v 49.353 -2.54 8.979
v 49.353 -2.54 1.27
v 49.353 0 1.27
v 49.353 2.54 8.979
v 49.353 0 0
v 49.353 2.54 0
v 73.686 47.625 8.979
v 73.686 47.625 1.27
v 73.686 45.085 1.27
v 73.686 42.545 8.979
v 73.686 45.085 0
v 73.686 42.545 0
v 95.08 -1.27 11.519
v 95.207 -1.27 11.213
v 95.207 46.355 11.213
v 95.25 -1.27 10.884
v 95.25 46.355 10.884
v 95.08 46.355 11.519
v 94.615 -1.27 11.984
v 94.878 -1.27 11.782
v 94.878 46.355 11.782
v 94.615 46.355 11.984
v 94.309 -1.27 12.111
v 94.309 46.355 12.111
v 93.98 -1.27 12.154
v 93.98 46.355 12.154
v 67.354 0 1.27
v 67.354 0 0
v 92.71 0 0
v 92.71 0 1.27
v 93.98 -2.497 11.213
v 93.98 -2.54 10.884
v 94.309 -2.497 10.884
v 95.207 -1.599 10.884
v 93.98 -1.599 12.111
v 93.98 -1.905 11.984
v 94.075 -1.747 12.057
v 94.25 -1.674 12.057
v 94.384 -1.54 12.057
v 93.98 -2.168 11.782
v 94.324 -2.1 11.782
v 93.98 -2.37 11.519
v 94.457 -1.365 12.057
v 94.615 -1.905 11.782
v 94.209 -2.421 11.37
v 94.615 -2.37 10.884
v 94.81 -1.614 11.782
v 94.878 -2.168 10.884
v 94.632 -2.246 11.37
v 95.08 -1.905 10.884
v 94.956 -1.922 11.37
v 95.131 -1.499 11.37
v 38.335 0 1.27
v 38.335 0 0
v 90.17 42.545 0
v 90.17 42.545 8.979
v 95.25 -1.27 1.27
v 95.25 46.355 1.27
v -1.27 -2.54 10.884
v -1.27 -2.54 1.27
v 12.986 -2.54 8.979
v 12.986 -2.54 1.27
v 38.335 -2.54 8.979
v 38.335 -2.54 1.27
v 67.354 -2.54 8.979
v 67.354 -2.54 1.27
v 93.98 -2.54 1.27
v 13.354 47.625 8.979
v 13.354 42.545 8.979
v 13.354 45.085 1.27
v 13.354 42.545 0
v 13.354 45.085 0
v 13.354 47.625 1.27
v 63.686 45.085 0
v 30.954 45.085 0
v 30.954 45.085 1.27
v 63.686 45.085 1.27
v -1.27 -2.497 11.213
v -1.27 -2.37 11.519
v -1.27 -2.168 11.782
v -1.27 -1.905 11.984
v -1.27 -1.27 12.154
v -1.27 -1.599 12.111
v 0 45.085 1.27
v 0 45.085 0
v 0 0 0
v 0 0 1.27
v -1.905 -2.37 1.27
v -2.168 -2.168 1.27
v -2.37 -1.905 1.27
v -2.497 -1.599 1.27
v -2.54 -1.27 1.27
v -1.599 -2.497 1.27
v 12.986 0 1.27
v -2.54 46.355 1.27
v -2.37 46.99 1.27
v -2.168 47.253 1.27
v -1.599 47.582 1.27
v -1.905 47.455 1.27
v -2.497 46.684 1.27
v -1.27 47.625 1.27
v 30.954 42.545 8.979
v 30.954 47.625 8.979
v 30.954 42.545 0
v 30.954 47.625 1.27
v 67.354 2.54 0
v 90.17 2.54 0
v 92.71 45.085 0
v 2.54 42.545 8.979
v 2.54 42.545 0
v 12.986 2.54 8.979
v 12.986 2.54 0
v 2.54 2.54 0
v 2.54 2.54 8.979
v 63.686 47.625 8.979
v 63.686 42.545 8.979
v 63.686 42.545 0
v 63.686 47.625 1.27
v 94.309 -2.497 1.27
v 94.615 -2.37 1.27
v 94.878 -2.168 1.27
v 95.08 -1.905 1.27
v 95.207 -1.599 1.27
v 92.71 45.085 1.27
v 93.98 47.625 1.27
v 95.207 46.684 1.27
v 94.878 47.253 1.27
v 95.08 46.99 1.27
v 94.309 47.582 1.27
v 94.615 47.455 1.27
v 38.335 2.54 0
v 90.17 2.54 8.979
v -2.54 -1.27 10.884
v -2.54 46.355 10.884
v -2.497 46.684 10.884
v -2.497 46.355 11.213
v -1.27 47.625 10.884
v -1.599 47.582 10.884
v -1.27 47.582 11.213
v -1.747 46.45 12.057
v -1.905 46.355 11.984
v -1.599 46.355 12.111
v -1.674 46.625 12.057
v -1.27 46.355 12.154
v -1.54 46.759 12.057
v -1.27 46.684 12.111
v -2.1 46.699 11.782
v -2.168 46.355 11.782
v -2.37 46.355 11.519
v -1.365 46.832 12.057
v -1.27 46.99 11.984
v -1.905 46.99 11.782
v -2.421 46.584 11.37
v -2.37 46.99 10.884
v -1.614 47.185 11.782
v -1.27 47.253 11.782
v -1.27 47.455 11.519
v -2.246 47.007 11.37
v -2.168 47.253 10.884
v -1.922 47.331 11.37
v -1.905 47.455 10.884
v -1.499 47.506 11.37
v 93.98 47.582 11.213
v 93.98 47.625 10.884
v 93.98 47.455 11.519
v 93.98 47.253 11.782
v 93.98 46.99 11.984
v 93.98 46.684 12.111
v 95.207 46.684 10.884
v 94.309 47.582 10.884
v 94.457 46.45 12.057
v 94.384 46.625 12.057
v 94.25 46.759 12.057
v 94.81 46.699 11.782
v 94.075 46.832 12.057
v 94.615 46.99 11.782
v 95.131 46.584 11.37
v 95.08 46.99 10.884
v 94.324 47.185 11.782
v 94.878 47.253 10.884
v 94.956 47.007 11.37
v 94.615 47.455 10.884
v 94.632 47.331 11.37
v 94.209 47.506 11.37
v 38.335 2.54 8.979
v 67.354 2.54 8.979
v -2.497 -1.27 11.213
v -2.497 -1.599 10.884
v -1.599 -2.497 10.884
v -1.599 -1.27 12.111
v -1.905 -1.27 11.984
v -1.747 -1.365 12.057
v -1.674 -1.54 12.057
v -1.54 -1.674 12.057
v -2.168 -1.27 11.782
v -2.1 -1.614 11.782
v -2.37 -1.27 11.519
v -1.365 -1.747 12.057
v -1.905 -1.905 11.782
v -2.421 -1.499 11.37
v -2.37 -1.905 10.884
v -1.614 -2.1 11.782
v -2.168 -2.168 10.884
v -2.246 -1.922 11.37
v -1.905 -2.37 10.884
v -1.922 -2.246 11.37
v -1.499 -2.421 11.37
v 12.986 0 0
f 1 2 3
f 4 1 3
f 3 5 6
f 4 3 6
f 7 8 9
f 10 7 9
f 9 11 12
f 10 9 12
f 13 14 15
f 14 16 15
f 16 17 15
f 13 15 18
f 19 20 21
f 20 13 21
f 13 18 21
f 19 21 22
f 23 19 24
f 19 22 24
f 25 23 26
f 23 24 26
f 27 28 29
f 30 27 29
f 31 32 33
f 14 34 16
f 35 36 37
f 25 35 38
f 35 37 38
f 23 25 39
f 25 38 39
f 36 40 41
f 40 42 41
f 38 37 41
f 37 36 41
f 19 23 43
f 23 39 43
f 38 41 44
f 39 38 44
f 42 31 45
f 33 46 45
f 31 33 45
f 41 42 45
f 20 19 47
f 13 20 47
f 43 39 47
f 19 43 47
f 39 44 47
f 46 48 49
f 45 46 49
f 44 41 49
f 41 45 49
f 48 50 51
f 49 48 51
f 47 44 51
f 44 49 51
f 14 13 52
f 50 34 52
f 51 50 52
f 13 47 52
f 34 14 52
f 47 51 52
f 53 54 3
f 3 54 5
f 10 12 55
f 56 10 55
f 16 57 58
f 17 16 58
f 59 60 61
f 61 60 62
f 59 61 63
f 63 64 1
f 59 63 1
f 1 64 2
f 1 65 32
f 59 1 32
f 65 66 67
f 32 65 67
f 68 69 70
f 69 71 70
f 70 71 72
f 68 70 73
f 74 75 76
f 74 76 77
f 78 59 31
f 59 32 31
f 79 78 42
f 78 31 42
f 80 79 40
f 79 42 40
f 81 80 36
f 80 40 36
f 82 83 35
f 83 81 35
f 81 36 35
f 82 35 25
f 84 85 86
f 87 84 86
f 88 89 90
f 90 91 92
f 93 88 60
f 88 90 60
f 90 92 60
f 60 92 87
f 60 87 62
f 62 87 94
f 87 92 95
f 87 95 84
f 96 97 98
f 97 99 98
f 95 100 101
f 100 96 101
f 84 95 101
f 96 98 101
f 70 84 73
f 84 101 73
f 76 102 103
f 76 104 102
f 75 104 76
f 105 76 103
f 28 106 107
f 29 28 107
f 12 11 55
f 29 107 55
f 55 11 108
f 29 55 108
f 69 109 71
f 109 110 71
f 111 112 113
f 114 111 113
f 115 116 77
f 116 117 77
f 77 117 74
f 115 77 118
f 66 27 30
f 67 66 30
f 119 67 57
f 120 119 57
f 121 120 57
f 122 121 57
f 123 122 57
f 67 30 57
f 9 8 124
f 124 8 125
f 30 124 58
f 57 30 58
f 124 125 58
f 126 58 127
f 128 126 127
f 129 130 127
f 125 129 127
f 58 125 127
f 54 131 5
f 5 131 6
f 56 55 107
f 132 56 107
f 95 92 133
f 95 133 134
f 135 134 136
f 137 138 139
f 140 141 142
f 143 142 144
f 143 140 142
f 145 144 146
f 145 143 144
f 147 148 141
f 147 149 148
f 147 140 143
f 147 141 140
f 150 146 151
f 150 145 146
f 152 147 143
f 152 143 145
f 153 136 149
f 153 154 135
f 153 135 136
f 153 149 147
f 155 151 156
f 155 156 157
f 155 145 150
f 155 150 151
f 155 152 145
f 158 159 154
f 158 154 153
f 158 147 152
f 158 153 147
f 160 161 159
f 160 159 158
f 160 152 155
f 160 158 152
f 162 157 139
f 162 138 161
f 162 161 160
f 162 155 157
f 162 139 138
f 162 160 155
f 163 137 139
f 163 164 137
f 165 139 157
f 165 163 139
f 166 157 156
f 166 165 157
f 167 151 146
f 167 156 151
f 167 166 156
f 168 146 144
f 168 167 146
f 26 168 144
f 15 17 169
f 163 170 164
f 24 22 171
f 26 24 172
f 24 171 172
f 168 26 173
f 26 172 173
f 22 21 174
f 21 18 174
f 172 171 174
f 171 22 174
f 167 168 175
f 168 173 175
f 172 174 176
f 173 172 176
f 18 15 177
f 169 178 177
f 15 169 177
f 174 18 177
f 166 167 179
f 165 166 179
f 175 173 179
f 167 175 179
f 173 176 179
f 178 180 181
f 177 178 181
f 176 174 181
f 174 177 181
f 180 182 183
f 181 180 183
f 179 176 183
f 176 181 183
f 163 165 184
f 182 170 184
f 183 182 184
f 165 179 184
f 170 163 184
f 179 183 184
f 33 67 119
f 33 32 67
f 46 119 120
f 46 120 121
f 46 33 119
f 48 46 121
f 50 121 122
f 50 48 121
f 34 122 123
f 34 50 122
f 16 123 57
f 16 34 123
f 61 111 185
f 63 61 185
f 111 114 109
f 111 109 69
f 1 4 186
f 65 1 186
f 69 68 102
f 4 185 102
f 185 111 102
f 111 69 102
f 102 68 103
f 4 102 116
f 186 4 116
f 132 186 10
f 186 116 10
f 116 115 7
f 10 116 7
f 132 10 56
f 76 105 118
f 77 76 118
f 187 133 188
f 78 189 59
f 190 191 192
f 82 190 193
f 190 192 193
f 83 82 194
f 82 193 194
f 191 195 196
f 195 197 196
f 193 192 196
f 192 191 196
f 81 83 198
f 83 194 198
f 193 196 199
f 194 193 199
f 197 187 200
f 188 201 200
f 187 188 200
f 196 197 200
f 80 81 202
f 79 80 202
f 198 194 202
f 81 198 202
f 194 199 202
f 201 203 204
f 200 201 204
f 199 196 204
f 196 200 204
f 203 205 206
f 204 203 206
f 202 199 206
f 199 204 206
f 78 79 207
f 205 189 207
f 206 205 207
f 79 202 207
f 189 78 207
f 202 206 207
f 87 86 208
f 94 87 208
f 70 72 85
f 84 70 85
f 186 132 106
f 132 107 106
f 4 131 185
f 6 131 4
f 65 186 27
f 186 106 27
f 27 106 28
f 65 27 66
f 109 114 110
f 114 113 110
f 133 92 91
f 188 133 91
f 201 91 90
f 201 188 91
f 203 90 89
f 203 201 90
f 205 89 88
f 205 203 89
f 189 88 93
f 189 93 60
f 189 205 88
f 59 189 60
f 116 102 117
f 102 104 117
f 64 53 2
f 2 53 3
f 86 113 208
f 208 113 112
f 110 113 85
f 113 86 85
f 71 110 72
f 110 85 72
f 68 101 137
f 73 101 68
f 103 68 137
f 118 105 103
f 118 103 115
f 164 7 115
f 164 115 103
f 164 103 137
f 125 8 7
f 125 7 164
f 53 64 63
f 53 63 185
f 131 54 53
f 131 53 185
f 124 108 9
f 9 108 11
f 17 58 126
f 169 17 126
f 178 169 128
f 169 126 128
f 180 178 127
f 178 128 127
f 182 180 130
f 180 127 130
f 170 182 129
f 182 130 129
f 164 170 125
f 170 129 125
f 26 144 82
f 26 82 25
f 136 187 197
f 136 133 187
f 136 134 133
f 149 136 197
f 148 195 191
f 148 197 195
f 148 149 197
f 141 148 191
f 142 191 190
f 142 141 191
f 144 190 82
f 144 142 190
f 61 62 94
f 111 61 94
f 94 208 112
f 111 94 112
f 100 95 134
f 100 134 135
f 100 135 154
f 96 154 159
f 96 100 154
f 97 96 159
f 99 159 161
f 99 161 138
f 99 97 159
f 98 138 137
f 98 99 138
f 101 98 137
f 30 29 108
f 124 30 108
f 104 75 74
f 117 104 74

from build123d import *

# Parameters (mm, degrees)
F0_W     = 32.73212
F0_H     = 2.54
F0_W_2   = 11.01766
F1_DEPTH = 1.27
F2_W     = 32.73212
F2_H     = 5.08
F2_W_2   = 11.01766
F3_DEPTH = 7.7089
F4_W     = 97.79
F4_H     = 50.165
F5_DEPTH = 3.175
F6_R     = 1.27


with BuildPart() as f1:
    # F0 (on Top) → F1 (new body)
    with BuildSketch(Plane.XY):
        Polygon((13.35448, 42.545), (13.35448, 45.085), (0, 45.085), (0, 0), (12.98618, 0), (12.98618, 2.54), (2.54, 2.54), (2.54, 42.545), align=None)
        Polygon((73.68624, 42.545), (90.17, 42.545), (90.17, 2.54), (67.35402, 2.54), (67.35402, 0), (92.71, 0), (92.71, 45.085), (73.68624, 45.085), align=None)
        with Locations((47.3202, 43.815)):
            Rectangle(F0_W, F0_H)
        with Locations((43.84421, 1.27)):
            Rectangle(F0_W_2, F0_H)
    extrude(amount=F1_DEPTH)

    # F2 (on face) → F3 (join)
    with BuildSketch(Plane.XY.offset(1.27)):
        Polygon((12.98618, 2.54), (2.54, 2.54), (2.54, 42.545), (13.35448, 42.545), (13.35448, 47.625), (-2.54, 47.625), (-2.54, -2.54), (12.98618, -2.54), align=None)
        Polygon((90.17, 42.545), (90.17, 2.54), (67.35402, 2.54), (67.35402, -2.54), (95.25, -2.54), (95.25, 47.625), (73.68624, 47.625), (73.68624, 42.545), align=None)
        with Locations((47.3202, 45.085)):
            Rectangle(F2_W, F2_H)
        with Locations((43.84421, 0)):
            Rectangle(F2_W_2, F2_H)
    extrude(amount=F3_DEPTH)

    # F4 (on face) → F5 (join)
    with BuildSketch(Plane.XY.offset(8.9789)):
        with Locations((46.355, 22.5425)):
            Rectangle(F4_W, F4_H)
    extrude(amount=F5_DEPTH)

    # F6
    f6_edges = [f1.edges().sort_by_distance(p)[0] for p in [
        (95.25, -2.54, 6.71195),
        (-2.54, -2.54, 6.71195),
        (95.25, 47.625, 6.71195),
        (-2.54, 47.625, 6.71195),
        (-2.54, 22.5425, 12.1539),
        (46.355, -2.54, 12.1539),
        (95.25, 22.5425, 12.1539),
        (46.355, 47.625, 12.1539),
    ]]
    fillet(f6_edges, radius=F6_R)


solid = f1.part
